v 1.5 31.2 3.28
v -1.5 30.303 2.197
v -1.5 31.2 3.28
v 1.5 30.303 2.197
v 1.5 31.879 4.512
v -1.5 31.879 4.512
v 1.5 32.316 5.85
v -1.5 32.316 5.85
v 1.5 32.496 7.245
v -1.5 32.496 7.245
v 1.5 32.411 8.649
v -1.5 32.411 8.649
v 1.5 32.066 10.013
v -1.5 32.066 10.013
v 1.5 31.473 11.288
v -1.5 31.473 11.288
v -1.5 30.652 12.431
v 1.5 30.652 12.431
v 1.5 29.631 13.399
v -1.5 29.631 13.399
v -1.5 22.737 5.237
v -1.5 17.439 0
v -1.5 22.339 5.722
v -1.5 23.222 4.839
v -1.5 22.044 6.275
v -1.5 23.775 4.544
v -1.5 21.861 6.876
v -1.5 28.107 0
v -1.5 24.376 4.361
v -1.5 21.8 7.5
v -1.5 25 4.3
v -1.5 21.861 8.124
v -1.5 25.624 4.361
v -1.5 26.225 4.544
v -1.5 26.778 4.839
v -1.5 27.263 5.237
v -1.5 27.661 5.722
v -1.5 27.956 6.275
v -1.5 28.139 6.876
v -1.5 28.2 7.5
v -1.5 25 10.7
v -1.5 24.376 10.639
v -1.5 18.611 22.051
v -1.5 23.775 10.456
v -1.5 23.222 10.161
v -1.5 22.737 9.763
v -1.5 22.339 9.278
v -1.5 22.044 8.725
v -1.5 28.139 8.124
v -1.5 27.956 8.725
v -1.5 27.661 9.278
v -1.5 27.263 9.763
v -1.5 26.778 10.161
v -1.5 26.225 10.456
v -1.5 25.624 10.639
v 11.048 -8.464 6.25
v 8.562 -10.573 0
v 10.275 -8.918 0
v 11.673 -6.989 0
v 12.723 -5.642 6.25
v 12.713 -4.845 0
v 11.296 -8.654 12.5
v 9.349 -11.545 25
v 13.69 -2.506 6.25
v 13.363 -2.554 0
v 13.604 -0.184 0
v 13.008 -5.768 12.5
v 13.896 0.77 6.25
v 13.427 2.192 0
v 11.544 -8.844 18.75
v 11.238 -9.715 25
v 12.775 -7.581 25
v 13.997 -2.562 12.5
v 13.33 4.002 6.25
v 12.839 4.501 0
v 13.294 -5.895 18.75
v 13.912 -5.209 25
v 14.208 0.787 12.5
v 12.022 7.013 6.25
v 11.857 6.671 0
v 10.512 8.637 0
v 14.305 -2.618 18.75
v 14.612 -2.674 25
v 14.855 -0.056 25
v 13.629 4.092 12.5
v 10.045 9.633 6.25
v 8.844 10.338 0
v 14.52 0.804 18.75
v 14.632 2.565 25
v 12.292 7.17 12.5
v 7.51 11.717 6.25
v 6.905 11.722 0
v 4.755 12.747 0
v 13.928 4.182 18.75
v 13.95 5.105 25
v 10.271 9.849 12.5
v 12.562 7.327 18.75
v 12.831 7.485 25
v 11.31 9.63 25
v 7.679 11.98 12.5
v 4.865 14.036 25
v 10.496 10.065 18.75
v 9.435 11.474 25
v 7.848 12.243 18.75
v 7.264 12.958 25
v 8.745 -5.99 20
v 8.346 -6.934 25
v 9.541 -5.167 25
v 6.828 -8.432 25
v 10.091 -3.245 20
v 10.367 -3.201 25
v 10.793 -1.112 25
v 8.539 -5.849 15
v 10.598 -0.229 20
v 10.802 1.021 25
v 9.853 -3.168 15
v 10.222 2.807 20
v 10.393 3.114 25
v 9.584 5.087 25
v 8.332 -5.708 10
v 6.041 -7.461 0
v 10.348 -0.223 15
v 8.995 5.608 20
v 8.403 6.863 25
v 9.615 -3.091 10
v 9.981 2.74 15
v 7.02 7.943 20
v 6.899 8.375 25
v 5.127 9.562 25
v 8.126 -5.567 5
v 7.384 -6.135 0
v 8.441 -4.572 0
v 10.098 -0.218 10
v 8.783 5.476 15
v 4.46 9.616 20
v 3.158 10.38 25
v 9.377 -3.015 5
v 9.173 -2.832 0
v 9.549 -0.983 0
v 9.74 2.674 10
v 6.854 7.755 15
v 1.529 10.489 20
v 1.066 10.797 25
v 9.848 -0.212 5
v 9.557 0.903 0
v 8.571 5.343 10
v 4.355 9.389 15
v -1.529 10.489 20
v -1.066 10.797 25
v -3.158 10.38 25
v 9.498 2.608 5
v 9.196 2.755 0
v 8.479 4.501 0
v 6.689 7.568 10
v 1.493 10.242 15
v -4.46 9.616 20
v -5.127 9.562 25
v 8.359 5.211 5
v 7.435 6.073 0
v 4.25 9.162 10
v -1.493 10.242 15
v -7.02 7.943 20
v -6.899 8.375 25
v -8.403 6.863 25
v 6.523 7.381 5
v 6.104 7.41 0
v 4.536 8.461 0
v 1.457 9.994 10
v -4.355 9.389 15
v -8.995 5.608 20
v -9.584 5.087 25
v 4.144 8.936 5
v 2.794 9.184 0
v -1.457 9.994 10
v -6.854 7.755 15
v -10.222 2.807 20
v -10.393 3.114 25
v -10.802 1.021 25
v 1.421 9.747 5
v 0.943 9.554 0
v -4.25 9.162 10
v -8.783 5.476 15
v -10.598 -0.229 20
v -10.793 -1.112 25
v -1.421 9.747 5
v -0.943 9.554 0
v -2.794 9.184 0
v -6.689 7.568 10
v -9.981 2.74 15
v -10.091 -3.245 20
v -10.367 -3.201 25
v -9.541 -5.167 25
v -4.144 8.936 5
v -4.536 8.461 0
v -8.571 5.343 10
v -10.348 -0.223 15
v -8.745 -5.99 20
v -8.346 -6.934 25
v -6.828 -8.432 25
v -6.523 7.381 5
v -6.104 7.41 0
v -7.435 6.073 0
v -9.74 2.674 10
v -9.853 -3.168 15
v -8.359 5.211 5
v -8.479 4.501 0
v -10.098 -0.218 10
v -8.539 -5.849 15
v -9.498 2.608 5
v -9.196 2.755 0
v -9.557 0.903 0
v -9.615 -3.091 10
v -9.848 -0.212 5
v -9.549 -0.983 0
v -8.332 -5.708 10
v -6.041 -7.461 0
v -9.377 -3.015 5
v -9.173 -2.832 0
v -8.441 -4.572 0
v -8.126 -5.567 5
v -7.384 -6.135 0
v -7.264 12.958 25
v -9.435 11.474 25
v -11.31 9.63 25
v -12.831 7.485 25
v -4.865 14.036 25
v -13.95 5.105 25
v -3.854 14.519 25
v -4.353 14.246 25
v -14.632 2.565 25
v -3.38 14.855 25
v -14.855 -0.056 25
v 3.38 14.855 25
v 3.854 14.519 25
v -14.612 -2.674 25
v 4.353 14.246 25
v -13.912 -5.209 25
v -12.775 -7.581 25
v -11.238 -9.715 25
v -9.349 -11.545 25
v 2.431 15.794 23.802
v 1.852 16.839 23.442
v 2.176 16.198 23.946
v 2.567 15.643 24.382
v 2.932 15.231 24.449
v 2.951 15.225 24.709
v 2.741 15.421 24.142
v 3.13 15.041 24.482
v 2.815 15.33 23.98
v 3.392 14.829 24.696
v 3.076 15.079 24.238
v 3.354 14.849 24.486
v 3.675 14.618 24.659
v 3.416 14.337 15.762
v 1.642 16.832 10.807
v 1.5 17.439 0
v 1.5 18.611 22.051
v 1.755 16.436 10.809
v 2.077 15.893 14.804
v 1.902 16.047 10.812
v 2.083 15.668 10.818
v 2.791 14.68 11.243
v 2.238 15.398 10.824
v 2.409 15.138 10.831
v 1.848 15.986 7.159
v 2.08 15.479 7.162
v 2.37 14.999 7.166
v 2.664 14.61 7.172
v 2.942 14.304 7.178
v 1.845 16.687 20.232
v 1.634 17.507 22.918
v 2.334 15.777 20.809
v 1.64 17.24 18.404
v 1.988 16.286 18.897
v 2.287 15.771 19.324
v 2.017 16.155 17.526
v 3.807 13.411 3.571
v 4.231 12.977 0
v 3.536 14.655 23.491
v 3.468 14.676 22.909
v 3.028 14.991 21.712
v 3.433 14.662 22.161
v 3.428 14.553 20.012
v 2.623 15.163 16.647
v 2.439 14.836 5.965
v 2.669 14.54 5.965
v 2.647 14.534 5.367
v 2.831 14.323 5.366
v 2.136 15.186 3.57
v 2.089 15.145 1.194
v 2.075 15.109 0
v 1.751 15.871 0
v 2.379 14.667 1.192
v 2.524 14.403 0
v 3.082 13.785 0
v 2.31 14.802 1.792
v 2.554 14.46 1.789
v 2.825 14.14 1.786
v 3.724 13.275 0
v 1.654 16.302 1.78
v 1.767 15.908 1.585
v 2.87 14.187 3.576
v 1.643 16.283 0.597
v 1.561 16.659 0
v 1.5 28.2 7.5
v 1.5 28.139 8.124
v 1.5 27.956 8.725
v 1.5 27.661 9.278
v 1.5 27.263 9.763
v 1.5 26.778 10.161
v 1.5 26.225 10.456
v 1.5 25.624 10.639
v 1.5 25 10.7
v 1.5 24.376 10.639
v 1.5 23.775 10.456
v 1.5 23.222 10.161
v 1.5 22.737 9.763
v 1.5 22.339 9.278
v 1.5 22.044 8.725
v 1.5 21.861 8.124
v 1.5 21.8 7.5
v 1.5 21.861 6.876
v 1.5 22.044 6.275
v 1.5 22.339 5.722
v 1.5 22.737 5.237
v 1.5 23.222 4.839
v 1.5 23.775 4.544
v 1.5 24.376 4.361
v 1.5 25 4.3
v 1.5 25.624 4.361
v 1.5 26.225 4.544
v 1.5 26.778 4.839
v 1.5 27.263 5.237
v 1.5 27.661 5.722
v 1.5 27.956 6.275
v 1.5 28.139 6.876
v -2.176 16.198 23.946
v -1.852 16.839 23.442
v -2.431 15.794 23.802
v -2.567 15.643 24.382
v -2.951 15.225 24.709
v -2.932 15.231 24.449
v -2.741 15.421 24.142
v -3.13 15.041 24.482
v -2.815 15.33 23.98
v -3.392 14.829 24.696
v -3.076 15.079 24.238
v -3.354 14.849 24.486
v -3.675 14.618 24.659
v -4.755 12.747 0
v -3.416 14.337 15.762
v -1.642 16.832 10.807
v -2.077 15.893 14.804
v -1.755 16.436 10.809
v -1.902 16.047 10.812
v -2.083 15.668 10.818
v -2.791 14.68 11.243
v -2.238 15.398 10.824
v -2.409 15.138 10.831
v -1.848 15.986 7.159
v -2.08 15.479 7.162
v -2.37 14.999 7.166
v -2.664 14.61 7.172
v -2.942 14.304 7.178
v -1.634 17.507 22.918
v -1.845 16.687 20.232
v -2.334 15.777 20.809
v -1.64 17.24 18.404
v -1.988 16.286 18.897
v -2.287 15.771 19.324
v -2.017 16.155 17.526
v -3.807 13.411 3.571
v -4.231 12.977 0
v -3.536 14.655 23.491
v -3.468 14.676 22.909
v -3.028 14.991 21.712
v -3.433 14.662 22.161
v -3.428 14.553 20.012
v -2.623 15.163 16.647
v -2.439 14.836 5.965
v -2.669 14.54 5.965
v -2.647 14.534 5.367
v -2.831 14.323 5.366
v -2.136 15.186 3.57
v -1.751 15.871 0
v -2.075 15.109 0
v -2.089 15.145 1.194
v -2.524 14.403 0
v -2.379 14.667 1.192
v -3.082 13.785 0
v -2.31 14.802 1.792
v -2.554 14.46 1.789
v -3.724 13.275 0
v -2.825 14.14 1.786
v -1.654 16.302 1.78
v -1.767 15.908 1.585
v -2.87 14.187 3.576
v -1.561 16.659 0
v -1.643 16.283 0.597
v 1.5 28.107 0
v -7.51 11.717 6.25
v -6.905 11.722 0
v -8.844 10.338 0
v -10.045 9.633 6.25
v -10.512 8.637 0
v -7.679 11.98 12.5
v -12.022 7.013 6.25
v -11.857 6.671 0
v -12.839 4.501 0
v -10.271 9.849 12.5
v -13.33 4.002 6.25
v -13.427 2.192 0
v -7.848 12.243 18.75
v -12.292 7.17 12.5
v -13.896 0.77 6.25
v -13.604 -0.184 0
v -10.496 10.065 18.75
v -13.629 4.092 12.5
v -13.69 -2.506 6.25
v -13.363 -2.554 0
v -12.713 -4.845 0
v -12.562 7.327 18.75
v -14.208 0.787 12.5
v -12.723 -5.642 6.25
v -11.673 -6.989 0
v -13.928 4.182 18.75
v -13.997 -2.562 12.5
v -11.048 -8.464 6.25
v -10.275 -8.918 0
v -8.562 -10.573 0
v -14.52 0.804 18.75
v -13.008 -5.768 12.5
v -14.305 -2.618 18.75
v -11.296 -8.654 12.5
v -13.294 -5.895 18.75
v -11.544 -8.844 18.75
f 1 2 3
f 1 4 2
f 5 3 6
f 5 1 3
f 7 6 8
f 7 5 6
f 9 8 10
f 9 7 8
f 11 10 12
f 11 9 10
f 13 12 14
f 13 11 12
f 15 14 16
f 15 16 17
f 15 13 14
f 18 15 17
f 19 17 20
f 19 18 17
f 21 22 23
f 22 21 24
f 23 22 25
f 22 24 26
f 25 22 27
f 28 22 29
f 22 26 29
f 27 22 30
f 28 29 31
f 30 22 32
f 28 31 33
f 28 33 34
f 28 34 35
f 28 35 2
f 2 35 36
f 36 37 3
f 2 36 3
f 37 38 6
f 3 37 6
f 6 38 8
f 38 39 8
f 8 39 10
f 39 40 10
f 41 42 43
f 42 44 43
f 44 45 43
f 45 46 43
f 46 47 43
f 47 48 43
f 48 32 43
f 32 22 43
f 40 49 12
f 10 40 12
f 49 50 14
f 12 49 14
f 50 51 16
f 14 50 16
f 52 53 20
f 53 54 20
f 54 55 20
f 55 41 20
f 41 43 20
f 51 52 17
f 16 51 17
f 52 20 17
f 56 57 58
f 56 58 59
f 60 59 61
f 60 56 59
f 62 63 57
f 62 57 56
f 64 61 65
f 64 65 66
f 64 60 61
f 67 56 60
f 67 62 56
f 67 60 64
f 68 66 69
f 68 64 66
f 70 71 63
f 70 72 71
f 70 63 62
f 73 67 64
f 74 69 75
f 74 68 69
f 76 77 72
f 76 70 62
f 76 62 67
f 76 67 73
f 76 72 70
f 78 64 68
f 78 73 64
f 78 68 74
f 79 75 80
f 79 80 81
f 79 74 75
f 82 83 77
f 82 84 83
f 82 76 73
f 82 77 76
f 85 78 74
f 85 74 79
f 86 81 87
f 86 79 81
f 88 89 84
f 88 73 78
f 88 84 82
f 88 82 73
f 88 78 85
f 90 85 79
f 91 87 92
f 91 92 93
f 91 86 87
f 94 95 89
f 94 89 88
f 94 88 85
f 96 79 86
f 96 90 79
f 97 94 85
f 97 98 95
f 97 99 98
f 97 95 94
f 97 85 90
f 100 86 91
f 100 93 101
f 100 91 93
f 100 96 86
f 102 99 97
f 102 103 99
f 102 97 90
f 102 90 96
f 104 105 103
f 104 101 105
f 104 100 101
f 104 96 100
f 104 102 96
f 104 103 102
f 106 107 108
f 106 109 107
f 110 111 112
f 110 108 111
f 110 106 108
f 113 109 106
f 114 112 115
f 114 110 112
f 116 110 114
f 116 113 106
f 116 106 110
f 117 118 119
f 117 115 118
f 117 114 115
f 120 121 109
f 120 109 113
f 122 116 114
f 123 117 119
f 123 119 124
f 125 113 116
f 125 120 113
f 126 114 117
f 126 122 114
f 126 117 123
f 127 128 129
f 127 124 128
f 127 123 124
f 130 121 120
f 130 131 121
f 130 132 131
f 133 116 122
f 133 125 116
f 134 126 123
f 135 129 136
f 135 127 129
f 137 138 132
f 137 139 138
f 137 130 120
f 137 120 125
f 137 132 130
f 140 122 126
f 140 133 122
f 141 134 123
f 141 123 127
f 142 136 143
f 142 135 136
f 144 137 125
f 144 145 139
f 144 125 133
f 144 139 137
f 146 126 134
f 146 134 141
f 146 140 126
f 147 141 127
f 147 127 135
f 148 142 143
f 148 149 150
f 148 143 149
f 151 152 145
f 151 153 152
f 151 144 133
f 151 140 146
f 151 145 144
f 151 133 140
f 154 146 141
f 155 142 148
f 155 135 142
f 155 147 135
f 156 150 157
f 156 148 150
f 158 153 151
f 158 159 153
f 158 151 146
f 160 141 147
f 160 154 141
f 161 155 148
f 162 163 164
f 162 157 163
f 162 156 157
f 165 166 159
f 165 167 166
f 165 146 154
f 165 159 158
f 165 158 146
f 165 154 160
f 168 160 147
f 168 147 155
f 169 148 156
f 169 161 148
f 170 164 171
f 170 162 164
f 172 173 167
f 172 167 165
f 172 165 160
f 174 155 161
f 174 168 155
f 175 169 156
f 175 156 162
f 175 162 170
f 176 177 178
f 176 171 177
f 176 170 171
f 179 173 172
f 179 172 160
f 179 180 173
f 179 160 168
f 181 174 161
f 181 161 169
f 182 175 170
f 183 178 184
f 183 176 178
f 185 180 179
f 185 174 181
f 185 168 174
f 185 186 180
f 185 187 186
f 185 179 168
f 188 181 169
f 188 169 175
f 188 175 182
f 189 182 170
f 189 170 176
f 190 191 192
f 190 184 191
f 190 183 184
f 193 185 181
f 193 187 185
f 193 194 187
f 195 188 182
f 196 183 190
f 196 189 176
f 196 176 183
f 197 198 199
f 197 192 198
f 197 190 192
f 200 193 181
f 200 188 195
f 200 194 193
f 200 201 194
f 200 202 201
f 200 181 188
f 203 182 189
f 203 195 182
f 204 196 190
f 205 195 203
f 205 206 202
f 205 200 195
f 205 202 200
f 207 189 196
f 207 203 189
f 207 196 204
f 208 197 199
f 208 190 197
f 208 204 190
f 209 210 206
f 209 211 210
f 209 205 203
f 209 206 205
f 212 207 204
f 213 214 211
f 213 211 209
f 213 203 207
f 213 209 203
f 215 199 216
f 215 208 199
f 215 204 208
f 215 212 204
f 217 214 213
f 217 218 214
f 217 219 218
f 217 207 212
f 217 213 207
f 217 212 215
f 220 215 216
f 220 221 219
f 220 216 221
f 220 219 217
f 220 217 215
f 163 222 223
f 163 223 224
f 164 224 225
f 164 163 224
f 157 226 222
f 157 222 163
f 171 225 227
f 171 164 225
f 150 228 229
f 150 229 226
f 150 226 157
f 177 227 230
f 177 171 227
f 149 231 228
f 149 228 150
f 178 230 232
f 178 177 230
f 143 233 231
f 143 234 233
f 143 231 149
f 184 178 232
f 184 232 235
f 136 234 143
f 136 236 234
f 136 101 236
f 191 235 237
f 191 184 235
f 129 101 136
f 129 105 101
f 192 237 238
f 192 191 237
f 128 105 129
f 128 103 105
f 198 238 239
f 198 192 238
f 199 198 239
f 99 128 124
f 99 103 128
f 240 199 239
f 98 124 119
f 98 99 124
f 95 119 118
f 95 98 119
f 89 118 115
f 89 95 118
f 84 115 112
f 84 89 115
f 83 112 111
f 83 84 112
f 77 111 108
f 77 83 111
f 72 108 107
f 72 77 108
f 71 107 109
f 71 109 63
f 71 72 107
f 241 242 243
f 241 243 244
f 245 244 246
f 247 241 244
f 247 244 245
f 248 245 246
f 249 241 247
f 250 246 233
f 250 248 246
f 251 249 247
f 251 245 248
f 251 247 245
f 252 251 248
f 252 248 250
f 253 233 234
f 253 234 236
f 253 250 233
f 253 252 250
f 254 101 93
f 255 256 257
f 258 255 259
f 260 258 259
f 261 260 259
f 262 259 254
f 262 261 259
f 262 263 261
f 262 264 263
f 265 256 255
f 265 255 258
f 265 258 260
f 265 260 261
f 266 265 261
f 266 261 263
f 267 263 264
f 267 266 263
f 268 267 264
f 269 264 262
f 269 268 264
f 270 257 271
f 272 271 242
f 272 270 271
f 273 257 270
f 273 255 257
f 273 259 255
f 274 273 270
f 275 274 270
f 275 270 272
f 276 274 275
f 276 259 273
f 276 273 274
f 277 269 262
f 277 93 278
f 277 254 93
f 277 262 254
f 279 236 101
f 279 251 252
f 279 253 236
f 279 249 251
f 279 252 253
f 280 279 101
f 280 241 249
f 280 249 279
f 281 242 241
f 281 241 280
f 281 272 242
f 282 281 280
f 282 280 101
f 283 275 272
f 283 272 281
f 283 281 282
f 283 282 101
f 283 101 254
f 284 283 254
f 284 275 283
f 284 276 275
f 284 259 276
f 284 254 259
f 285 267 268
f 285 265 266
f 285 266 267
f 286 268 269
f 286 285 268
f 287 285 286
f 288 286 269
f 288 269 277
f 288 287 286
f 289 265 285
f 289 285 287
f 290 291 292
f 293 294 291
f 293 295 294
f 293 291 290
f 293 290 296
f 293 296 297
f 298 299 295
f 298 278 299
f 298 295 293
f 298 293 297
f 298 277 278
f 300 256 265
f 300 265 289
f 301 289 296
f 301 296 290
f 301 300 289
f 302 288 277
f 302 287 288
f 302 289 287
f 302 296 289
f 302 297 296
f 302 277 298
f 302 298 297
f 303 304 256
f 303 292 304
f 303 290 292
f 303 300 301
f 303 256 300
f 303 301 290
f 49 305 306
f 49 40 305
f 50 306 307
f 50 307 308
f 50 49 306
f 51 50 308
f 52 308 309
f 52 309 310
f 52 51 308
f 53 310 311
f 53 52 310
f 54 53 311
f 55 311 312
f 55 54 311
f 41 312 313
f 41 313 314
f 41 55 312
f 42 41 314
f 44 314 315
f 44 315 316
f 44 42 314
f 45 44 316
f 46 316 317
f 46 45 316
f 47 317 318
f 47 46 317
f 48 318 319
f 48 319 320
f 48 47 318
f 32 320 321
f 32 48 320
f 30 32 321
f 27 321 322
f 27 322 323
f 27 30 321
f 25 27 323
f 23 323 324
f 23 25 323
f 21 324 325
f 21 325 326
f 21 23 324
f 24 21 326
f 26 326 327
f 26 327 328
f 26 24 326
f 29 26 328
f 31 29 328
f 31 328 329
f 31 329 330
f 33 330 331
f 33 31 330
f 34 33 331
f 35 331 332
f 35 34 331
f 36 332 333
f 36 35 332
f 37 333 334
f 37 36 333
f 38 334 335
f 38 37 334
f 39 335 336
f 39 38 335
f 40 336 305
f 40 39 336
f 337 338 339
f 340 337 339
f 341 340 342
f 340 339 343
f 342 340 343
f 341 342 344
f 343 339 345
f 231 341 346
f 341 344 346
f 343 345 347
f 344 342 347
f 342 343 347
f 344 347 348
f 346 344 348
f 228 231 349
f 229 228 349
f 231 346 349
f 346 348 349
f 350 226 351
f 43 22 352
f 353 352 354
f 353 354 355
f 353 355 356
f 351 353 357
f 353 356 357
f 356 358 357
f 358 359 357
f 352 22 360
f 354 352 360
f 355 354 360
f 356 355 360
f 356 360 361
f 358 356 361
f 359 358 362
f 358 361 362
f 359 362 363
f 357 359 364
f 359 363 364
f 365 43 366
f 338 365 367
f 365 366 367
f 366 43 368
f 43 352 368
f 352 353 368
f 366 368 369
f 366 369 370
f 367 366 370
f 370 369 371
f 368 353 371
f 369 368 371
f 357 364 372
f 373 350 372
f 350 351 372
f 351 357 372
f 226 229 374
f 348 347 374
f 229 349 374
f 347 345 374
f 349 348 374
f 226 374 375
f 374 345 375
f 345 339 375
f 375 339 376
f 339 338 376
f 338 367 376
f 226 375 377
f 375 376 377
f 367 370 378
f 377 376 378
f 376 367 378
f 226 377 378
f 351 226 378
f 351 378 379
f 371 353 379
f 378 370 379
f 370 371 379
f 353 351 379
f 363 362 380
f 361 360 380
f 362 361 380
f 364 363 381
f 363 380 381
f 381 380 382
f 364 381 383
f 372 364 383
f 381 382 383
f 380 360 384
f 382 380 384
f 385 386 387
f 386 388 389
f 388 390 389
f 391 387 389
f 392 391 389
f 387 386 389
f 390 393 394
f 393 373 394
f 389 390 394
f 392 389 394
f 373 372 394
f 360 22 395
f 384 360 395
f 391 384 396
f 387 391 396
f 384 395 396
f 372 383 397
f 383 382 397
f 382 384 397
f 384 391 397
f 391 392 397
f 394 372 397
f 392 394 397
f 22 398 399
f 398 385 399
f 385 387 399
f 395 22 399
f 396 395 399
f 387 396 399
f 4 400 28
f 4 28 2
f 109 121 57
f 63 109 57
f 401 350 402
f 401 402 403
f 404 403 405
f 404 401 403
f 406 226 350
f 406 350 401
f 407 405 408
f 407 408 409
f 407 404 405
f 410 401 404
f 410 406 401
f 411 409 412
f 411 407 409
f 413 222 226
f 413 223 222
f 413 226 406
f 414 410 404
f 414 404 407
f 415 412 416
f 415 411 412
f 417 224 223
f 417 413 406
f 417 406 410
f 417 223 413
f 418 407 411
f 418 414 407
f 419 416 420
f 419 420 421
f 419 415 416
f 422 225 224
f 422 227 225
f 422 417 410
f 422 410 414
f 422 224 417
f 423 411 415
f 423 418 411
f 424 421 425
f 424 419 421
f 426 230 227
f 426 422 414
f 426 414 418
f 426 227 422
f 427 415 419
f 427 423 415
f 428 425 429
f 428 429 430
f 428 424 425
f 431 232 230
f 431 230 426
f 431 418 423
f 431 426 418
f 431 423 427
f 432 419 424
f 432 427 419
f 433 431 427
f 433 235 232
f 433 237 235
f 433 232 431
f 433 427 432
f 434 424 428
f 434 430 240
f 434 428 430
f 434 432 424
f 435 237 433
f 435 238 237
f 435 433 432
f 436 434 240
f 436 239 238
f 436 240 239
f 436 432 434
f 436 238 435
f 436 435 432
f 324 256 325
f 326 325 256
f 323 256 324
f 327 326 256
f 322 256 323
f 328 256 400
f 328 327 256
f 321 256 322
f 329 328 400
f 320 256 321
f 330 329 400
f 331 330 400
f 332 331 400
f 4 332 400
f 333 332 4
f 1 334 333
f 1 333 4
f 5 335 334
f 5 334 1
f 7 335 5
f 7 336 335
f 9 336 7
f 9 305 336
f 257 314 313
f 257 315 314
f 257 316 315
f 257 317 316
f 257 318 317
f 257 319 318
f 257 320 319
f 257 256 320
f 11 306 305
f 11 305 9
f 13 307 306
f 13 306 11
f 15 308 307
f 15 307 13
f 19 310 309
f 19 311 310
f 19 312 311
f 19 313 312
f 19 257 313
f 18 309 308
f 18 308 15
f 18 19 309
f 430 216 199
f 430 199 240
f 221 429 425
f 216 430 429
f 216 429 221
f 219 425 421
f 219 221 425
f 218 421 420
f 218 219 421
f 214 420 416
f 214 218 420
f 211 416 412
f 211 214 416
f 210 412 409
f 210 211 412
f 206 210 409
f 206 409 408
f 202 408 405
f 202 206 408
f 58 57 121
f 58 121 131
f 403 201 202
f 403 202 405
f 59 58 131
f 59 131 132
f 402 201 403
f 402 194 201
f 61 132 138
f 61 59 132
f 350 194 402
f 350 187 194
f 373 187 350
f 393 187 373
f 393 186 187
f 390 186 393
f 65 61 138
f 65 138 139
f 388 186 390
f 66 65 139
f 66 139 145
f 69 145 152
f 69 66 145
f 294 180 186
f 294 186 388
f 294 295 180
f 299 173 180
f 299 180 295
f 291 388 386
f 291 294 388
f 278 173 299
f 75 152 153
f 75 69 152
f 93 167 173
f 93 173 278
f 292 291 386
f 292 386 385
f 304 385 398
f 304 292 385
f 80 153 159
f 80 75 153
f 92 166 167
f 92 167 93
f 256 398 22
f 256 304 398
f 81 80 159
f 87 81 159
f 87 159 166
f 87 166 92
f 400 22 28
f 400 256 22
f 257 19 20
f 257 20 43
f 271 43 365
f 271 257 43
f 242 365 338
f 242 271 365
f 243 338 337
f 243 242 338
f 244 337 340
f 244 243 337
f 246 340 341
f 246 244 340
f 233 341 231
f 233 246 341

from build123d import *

# Parameters (mm, degrees)
F1_ANGLE_BACK = 141
F1_ANGLE      = 282
F2_R          = 3.2
F3_DEPTH      = 1.5
F4_R          = 5


with BuildPart() as f1:
    # F0 (on Right) → F1 (revolve)
    with BuildSketch(Plane.YZ, mode=Mode.PRIVATE) as f1_sk:
        Polygon((9.6, 0), (13.6049968789, 0), (14.8549968789, 25), (10.85, 25), align=None)
    revolve(f1_sk.sketch.rotate(Axis((0, 0, 12.5), (0, 0, 1)), -F1_ANGLE_BACK), axis=Axis((0, 0, 12.5), (0, 0, 1)), revolution_arc=F1_ANGLE)

    # F2 (on Right) → F3 (join, symmetric)
    with BuildSketch(Plane.YZ):
        with BuildLine():
            Line((14.8549968789, 25), (10.85, 25))
            Line((10.85, 25), (9.6, 0))
            Line((9.6, 0), (25, 0))
            Line((25, 0), (28.1066017178, 0))
            Line((28.1066017178, 0), (30.3033008589, 2.1966991411))
            ThreePointArc((30.3033008589, 2.1966991411), (32.4865458897, 7.9490330074), (29.6313916174, 13.3991704236))
            Line((29.6313916174, 13.3991704236), (14.8549968789, 25))
        make_face()
        with Locations((25, 7.5)):
            Circle(F2_R, mode=Mode.SUBTRACT)
    extrude(amount=F3_DEPTH, both=True)

    # F4 (call 1 of 2: OpenCascade refuses the feature's edges together)
    f4_edges = [f1.edges().sort_by_distance(p)[0] for p in [
        (1.5, 14.150717, 12.499992),
    ]]
    fillet(f4_edges, radius=F4_R)

    # F4#2 (call 2 of 2)
    f4_2_edges = [f1.edges().sort_by_distance(p)[0] for p in [
        (-1.5, 14.150717, 12.499992),
    ]]
    fillet(f4_2_edges, radius=F4_R)


solid = f1.part
